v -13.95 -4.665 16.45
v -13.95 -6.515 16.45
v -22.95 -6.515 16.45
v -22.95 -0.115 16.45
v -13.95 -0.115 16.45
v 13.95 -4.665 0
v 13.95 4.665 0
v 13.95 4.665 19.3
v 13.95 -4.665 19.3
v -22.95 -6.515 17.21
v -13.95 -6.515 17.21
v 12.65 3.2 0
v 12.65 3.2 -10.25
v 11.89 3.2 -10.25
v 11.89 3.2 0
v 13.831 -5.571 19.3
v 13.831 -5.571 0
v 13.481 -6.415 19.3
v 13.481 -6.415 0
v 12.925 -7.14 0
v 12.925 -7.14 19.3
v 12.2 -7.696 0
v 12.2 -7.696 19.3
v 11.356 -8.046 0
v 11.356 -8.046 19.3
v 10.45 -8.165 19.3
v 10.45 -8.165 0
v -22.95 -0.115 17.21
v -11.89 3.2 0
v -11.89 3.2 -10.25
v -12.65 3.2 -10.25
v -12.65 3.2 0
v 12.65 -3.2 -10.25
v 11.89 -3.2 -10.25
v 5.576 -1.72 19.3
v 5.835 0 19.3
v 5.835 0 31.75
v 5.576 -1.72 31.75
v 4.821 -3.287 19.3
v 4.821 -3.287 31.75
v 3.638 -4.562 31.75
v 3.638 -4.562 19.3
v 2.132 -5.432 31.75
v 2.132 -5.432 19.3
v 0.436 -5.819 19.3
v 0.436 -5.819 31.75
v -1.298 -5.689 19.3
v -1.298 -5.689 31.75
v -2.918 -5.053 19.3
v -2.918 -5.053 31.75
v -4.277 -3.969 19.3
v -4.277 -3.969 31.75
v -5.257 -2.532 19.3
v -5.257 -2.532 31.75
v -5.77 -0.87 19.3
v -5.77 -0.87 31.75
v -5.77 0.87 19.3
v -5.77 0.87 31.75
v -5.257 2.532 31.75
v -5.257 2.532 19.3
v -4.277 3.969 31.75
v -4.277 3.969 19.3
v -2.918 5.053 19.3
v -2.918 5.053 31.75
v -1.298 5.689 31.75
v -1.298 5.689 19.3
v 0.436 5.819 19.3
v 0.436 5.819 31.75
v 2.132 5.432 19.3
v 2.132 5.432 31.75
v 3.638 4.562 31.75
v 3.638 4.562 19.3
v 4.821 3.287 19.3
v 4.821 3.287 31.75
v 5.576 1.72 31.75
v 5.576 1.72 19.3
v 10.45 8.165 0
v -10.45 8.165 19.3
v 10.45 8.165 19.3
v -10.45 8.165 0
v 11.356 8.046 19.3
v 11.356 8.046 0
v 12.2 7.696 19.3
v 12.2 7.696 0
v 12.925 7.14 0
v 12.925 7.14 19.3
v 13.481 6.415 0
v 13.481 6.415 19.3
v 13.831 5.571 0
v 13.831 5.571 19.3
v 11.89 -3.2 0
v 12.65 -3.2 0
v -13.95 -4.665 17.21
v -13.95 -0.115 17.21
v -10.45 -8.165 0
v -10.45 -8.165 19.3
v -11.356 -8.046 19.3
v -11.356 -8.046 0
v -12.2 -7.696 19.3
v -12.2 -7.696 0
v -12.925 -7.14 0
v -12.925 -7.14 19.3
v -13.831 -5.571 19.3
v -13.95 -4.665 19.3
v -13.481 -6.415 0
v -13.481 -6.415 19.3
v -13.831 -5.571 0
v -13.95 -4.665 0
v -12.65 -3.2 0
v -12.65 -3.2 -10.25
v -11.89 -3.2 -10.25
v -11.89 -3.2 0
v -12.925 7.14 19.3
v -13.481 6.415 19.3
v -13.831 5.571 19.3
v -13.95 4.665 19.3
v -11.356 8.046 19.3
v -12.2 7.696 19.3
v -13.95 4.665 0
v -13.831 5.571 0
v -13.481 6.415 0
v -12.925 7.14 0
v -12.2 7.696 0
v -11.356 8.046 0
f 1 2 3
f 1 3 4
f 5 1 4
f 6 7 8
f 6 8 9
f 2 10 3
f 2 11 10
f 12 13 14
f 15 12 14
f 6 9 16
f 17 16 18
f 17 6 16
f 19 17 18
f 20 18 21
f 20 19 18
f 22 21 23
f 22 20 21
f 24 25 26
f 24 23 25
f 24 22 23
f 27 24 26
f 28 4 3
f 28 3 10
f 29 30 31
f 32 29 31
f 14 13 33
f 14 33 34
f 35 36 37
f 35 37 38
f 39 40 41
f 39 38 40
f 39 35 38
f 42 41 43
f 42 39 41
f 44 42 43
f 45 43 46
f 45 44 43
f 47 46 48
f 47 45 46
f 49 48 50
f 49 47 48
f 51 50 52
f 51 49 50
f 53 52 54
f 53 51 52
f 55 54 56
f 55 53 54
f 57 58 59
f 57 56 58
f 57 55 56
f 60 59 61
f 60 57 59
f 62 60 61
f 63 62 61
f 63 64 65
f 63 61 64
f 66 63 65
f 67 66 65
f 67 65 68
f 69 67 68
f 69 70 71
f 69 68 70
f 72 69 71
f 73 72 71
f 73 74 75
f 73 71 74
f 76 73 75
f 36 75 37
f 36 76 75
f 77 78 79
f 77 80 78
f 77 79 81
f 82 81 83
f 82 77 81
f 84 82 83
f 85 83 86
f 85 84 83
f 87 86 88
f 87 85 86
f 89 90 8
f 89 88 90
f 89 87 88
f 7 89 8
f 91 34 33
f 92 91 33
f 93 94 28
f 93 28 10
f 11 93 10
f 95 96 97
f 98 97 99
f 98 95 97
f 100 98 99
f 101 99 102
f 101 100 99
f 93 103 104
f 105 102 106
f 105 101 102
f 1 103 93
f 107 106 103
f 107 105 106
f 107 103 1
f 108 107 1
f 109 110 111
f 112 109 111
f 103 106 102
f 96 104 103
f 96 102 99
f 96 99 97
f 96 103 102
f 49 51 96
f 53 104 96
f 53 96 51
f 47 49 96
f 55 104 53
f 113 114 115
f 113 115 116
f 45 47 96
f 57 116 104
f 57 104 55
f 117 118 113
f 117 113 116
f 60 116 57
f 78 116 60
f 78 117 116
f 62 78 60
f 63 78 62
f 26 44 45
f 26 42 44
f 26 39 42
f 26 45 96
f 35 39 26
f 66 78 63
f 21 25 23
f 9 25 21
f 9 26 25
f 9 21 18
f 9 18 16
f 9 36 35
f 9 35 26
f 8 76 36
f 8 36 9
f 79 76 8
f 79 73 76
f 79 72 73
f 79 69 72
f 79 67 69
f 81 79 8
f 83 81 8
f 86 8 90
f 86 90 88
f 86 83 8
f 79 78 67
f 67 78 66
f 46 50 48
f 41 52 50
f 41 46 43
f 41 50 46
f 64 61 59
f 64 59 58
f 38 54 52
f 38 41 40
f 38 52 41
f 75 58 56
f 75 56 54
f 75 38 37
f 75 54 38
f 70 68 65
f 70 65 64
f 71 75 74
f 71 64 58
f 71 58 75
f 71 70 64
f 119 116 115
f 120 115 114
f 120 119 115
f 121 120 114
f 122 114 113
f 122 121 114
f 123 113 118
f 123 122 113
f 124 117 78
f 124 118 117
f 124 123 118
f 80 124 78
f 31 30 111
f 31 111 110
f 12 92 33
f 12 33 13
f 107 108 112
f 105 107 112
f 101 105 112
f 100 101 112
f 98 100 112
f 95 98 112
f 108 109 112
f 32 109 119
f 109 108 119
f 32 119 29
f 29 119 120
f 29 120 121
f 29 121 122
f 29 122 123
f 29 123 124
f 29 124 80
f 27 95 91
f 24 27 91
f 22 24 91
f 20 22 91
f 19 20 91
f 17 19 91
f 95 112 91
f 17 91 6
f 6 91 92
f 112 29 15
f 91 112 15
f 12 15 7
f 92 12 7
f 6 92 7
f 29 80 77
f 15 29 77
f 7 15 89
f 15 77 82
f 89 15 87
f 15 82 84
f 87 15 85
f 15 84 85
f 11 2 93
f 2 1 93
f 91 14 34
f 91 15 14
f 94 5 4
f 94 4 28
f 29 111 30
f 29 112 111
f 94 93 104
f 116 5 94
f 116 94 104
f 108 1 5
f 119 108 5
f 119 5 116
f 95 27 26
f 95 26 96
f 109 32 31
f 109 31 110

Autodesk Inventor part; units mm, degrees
ref_plane "Plan YZ" through (0, 0, 0) normal (1, 0, 0) x (0, 1, 0)
ref_plane "Plan XZ" through (0, 0, 0) normal (0, 1, 0) x (-1, 0, 0)
ref_plane "Plan XY" through (0, 0, 0) normal (0, 0, 1) x (1, 0, 0)
sketch "Esquisse1" plane through (0, 0, 0) normal (0, 0, 1) x (1, 0, 0)
  line L0 (-10.45, 8.165) -> (10.45, 8.165)
  line L1 (13.95, 4.665) -> (13.95, -4.665)
  line L2 (10.45, -8.165) -> (-10.45, -8.165)
  line L3 (-13.95, -4.665) -> (-13.95, 4.665)
  line L4 (-20.5448, 0) -> (20.5448, 0) construction
  line L5 (0, -12.4458) -> (0, 12.4458) construction
  arc A0 (-10.45, 8.165) -> (-13.95, 4.665) centre (-10.45, 4.665) ccw
  arc A1 (13.95, 4.665) -> (10.45, 8.165) centre (10.45, 4.665) ccw
  arc A2 (10.45, -8.165) -> (13.95, -4.665) centre (10.45, -4.665) ccw
  arc A3 (-13.95, -4.665) -> (-10.45, -8.165) centre (-10.45, -4.665) ccw
  point P0 (0, 0)
  point P1 (-13.95, 8.165)
  point P2 (13.95, 8.165)
  point P3 (-13.95, -8.165)
  dimension "d0" = 16.33
  dimension "d1" = 27.9
  dimension "d2" = 3.5
extrude "Extrusion1" add sketch "Esquisse1" along normal blind 19.3
sketch "Esquisse6" plane through (0, 0, 19.3) normal (0, 0, 1) x (1, 0, 0)
  circle A0 centre (0, 0) radius 5.835
  dimension "d5" = 11.67
extrude "Extrusion2" add sketch "Esquisse6" along normal blind 12.45
thread "Filetage1" size "M12x1.75" class "6g" standard "ISO M" full length
sketch "Esquisse7" plane through (0, 0, 0) normal (0, 0, -1) x (-1, 0, 0)
  line L0 (0, -11.431) -> (0, 11.431) construction
  line L1 (19.53, 0) -> (-19.53, 0) construction
  line L2 (12.65, -3.2) -> (11.89, -3.2)
  line L3 (11.89, -3.2) -> (11.89, 3.2)
  line L4 (11.89, 3.2) -> (12.65, 3.2)
  line L5 (12.65, 3.2) -> (12.65, -3.2)
  line L6 (-11.89, -3.2) -> (-12.65, -3.2)
  line L7 (-12.65, -3.2) -> (-12.65, 3.2)
  line L8 (-12.65, 3.2) -> (-11.89, 3.2)
  line L9 (-11.89, 3.2) -> (-11.89, -3.2)
  line L10 (13.95, -4.665) -> (13.95, 4.665) construction
  point P0 (0, 0)
  dimension "d10" = 1.3
  dimension "d11" = 0.76
  dimension "d12" = 6.4
extrude "Extrusion3" add sketch "Esquisse7" along normal blind 10.25
sketch "Esquisse8" plane through (-13.95, -4.665, 0) normal (-1, 0, 0) x (0, 0, 1)
  line L0 (16.45, 4.55) -> (17.21, 4.55)
  line L1 (17.21, 4.55) -> (17.21, -1.85)
  line L2 (17.21, -1.85) -> (16.45, -1.85)
  line L3 (16.45, -1.85) -> (16.45, 4.55)
  line L4 (19.3, 9.33) -> (19.3, 0) construction
  line L5 (0, -3.5) -> (19.3, -3.5) projected
  point P0 (0, 4.665)
  dimension "d15" = 2.85
  dimension "d16" = 0.76
  dimension "d17" = 6.4
  dimension "d18" = 1.65
extrude "Extrusion4" add sketch "Esquisse8" along normal blind 9
equation "\"d16\" = d11"
equation "\"d17\" = d12"
properties part number "P1704_002_picotte_alexandre" material "."
